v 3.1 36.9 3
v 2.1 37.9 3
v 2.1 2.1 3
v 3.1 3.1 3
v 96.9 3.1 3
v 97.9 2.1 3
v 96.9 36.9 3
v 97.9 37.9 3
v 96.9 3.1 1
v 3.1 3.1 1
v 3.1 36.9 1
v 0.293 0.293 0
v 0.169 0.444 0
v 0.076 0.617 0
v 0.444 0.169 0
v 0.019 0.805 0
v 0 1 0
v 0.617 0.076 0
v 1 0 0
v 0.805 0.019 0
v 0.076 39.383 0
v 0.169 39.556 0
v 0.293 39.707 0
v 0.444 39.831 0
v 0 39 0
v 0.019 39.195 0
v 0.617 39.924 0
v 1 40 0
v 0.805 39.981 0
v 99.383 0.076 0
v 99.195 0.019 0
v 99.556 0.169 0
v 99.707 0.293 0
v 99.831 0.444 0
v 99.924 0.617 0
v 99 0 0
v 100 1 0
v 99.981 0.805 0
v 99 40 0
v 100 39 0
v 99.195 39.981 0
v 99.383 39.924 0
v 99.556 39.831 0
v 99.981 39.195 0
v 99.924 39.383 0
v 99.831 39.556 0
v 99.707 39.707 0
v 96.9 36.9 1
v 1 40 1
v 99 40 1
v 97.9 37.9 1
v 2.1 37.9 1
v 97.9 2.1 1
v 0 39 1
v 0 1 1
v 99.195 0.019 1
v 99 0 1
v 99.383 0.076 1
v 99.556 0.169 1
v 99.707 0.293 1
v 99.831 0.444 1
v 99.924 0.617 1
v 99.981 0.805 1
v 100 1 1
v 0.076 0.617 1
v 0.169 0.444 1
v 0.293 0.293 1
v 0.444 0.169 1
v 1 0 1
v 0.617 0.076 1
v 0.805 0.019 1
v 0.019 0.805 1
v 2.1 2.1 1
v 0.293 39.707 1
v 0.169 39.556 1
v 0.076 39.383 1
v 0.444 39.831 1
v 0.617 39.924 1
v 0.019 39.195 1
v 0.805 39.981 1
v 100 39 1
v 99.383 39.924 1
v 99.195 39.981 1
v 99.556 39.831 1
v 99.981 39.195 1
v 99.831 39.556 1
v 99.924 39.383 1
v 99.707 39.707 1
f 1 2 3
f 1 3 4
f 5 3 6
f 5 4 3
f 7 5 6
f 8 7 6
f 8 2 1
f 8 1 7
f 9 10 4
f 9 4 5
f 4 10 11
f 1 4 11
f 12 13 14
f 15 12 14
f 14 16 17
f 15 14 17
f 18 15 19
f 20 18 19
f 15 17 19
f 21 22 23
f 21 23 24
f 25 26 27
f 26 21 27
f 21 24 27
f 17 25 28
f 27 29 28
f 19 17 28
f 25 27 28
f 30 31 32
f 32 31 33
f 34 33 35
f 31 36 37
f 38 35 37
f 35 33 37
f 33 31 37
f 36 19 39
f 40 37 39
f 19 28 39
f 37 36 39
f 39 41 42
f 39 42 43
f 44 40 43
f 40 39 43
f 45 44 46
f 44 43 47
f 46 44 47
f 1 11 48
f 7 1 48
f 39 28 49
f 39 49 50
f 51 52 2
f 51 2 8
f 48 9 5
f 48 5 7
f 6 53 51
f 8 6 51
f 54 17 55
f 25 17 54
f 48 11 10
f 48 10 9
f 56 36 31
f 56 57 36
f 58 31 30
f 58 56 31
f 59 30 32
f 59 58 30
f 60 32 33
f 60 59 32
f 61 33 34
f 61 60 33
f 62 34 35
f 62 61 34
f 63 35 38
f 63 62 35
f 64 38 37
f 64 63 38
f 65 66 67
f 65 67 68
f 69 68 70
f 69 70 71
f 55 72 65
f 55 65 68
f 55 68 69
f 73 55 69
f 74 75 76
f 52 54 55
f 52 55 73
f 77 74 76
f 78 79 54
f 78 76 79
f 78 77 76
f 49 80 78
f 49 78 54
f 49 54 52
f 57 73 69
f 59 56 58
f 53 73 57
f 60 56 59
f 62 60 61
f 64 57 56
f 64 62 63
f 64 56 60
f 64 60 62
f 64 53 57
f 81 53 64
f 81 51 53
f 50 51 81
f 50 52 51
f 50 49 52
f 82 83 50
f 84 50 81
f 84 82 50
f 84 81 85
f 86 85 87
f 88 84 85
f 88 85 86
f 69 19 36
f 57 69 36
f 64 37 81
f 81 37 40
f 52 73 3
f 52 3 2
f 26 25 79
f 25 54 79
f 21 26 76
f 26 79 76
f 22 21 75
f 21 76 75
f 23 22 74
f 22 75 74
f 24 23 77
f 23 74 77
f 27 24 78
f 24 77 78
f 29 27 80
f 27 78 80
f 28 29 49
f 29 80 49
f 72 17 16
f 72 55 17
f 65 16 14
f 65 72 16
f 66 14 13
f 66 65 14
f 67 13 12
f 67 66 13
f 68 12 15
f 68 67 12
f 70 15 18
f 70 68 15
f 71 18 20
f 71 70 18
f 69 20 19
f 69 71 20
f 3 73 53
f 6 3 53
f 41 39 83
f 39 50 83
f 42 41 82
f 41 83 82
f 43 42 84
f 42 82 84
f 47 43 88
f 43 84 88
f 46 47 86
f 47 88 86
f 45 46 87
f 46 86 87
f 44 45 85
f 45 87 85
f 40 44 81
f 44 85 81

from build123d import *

# Parameters (mm, degrees)
F0_W     = 100
F0_H     = 40
F1_DEPTH = 1
F2_W     = 95.8
F2_H     = 35.8
F2_W_2   = 93.8
F2_H_2   = 33.8
F3_DEPTH = 2
F4_R     = 1


with BuildPart() as f1:
    # F0 (on Top) → F1 (new body)
    with BuildSketch(Plane.XY):
        with Locations((50, 20)):
            Rectangle(F0_W, F0_H)
    extrude(amount=F1_DEPTH)

    # F2 (on face) → F3 (join)
    with BuildSketch(Plane.XY.offset(1)):
        with Locations((50, 20)):
            Rectangle(F2_W, F2_H)
        with Locations((50, 20)):
            Rectangle(F2_W_2, F2_H_2, mode=Mode.SUBTRACT)
    extrude(amount=F3_DEPTH)

    # F4
    f4_edges = [f1.edges().sort_by_distance(p)[0] for p in [
        (0, 0, 0.5),
        (100, 0, 0.5),
        (100, 40, 0.5),
        (0, 40, 0.5),
    ]]
    fillet(f4_edges, radius=F4_R)


solid = f1.part
